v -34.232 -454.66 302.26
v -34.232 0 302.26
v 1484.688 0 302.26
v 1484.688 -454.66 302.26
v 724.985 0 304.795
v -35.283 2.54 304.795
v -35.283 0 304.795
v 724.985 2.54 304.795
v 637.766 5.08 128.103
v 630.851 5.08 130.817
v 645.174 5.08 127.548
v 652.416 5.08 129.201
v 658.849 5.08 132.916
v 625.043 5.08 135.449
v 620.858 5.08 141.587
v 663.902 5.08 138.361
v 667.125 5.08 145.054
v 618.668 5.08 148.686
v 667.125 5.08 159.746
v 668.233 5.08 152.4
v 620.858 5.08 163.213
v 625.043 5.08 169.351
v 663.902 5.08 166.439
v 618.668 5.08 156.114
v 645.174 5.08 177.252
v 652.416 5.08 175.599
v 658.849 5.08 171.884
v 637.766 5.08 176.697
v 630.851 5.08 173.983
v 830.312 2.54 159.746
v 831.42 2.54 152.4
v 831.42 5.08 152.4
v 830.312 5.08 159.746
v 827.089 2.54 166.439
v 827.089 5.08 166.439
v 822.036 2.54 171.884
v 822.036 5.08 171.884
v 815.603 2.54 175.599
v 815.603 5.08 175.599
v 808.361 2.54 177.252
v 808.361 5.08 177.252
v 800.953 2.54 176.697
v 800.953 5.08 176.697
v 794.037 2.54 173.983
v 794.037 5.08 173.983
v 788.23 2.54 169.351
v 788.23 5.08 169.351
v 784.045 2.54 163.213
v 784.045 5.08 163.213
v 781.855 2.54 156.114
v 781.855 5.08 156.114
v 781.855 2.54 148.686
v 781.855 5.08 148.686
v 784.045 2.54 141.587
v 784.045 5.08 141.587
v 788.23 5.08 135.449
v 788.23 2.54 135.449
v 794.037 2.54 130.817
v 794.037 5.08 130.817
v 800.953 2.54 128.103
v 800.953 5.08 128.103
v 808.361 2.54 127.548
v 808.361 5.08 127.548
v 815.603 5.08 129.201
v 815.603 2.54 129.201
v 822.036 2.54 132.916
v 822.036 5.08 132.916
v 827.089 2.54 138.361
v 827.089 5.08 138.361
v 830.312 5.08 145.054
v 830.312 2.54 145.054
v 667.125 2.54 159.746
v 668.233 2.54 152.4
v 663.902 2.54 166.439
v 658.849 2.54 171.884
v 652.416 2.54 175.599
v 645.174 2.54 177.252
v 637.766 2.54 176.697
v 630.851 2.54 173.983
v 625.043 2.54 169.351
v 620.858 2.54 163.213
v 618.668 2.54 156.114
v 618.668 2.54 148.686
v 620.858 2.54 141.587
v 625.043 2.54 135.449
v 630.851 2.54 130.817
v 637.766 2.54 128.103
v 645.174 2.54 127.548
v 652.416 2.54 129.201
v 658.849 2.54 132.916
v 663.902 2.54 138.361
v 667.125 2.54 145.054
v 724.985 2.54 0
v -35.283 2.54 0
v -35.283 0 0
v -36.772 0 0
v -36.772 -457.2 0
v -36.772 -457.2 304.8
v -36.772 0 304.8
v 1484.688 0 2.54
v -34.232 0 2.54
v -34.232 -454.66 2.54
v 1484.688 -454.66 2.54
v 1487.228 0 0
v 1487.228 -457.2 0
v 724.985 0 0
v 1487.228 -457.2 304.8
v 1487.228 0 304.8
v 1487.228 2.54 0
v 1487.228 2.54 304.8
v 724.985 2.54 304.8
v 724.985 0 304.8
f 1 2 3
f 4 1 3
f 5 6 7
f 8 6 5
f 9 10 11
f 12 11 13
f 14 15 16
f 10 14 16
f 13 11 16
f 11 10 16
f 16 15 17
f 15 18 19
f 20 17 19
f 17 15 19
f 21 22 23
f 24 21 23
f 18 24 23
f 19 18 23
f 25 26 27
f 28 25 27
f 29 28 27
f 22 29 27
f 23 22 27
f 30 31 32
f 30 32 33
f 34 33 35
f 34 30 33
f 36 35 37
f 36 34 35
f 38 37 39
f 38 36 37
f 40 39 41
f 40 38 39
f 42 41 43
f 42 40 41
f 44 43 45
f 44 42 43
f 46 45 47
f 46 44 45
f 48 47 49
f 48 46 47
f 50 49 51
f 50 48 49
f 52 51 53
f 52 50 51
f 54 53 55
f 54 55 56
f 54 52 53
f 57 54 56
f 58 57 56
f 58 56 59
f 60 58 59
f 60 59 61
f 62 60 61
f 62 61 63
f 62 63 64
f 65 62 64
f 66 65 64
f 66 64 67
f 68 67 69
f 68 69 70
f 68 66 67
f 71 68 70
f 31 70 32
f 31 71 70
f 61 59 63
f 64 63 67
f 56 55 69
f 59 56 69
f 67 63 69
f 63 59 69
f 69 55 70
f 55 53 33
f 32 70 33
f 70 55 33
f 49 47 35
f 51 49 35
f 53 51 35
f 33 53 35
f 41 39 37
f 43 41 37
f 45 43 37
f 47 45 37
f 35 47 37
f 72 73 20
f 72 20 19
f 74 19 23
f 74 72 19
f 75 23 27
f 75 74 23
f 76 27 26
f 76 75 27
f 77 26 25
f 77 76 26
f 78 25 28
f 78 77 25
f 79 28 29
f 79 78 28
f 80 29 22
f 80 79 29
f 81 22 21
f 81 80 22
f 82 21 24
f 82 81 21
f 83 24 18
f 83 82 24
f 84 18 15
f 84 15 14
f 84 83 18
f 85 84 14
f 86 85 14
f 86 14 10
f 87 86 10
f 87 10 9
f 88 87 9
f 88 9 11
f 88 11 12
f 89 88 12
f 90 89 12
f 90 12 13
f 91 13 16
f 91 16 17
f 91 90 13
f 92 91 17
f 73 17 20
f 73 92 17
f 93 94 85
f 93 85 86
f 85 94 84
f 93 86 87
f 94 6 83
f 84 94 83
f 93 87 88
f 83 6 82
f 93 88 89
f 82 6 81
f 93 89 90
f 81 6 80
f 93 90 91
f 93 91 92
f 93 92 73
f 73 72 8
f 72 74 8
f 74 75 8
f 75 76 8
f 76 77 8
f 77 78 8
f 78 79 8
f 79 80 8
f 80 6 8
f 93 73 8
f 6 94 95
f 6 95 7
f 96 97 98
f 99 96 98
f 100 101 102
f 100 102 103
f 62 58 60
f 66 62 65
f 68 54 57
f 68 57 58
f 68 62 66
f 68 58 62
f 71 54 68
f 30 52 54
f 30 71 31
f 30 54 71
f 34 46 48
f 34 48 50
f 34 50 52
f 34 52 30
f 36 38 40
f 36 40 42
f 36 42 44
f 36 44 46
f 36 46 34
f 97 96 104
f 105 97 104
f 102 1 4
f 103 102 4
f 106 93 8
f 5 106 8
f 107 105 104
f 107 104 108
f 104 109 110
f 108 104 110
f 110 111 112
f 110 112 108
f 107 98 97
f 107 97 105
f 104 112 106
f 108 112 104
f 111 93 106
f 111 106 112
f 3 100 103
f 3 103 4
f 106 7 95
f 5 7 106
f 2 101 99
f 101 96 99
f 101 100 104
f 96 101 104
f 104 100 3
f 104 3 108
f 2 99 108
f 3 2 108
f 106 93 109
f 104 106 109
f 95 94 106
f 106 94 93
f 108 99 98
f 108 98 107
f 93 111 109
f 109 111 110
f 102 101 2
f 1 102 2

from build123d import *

# Parameters (mm, degrees)
F0_W     = 1524
F0_H     = 304.8
F1_DEPTH = 457.2
F2_T     = -2.54
F4_W     = 760.2678739185
F4_H     = 304.7950782727
F5_DEPTH = 2.54
F6_R     = 24.9213487402
F7_DEPTH = 2.54
F8_W     = 762.243449688
F8_H     = 304.7996152788
F9_DEPTH = 2.54


with BuildPart() as f1:
    # F0 (on Front) → F1 (new body)
    with BuildSketch(Plane.XZ):
        with Locations((725.2281959057, 152.4)):
            Rectangle(F0_W, F0_H)
    extrude(amount=F1_DEPTH)

    # F2
    f2_openings = [f1.faces().sort_by_distance(p)[0] for p in [
        (725.228196, 0, 152.4),
    ]]
    offset(amount=F2_T, openings=f2_openings)


with BuildPart() as f5:
    # F4 (on offset) → F5 (new body)
    with BuildSketch(Plane.XZ.offset(-2.54)):
        with Locations((344.8506124159, 152.3975391363)):
            Rectangle(F4_W, F4_H)
    extrude(amount=F5_DEPTH)

    # F6 (on offset) → F7, piece 2 (join)
    with BuildSketch(Plane.XZ.offset(-2.54)):
        with Locations((643.3112621307, 152.4)):
            Circle(F6_R)
    extrude(amount=-F7_DEPTH)


with BuildPart() as f7:
    # F6 (on offset) → F7 (new body)
    with BuildSketch(Plane.XZ.offset(-2.54)):
        with Locations((806.498169899, 152.4)):
            Circle(F6_R)
    extrude(amount=-F7_DEPTH)


with BuildPart() as f9:
    # F8 (on offset) → F9 (new body)
    with BuildSketch(Plane.XZ.offset(-2.54)):
        with Locations((1106.1064302921, 152.3997788951)):
            Rectangle(F8_W, F8_H)
    extrude(amount=F9_DEPTH)


solid = Compound([f1.part, f5.part, f7.part, f9.part])
